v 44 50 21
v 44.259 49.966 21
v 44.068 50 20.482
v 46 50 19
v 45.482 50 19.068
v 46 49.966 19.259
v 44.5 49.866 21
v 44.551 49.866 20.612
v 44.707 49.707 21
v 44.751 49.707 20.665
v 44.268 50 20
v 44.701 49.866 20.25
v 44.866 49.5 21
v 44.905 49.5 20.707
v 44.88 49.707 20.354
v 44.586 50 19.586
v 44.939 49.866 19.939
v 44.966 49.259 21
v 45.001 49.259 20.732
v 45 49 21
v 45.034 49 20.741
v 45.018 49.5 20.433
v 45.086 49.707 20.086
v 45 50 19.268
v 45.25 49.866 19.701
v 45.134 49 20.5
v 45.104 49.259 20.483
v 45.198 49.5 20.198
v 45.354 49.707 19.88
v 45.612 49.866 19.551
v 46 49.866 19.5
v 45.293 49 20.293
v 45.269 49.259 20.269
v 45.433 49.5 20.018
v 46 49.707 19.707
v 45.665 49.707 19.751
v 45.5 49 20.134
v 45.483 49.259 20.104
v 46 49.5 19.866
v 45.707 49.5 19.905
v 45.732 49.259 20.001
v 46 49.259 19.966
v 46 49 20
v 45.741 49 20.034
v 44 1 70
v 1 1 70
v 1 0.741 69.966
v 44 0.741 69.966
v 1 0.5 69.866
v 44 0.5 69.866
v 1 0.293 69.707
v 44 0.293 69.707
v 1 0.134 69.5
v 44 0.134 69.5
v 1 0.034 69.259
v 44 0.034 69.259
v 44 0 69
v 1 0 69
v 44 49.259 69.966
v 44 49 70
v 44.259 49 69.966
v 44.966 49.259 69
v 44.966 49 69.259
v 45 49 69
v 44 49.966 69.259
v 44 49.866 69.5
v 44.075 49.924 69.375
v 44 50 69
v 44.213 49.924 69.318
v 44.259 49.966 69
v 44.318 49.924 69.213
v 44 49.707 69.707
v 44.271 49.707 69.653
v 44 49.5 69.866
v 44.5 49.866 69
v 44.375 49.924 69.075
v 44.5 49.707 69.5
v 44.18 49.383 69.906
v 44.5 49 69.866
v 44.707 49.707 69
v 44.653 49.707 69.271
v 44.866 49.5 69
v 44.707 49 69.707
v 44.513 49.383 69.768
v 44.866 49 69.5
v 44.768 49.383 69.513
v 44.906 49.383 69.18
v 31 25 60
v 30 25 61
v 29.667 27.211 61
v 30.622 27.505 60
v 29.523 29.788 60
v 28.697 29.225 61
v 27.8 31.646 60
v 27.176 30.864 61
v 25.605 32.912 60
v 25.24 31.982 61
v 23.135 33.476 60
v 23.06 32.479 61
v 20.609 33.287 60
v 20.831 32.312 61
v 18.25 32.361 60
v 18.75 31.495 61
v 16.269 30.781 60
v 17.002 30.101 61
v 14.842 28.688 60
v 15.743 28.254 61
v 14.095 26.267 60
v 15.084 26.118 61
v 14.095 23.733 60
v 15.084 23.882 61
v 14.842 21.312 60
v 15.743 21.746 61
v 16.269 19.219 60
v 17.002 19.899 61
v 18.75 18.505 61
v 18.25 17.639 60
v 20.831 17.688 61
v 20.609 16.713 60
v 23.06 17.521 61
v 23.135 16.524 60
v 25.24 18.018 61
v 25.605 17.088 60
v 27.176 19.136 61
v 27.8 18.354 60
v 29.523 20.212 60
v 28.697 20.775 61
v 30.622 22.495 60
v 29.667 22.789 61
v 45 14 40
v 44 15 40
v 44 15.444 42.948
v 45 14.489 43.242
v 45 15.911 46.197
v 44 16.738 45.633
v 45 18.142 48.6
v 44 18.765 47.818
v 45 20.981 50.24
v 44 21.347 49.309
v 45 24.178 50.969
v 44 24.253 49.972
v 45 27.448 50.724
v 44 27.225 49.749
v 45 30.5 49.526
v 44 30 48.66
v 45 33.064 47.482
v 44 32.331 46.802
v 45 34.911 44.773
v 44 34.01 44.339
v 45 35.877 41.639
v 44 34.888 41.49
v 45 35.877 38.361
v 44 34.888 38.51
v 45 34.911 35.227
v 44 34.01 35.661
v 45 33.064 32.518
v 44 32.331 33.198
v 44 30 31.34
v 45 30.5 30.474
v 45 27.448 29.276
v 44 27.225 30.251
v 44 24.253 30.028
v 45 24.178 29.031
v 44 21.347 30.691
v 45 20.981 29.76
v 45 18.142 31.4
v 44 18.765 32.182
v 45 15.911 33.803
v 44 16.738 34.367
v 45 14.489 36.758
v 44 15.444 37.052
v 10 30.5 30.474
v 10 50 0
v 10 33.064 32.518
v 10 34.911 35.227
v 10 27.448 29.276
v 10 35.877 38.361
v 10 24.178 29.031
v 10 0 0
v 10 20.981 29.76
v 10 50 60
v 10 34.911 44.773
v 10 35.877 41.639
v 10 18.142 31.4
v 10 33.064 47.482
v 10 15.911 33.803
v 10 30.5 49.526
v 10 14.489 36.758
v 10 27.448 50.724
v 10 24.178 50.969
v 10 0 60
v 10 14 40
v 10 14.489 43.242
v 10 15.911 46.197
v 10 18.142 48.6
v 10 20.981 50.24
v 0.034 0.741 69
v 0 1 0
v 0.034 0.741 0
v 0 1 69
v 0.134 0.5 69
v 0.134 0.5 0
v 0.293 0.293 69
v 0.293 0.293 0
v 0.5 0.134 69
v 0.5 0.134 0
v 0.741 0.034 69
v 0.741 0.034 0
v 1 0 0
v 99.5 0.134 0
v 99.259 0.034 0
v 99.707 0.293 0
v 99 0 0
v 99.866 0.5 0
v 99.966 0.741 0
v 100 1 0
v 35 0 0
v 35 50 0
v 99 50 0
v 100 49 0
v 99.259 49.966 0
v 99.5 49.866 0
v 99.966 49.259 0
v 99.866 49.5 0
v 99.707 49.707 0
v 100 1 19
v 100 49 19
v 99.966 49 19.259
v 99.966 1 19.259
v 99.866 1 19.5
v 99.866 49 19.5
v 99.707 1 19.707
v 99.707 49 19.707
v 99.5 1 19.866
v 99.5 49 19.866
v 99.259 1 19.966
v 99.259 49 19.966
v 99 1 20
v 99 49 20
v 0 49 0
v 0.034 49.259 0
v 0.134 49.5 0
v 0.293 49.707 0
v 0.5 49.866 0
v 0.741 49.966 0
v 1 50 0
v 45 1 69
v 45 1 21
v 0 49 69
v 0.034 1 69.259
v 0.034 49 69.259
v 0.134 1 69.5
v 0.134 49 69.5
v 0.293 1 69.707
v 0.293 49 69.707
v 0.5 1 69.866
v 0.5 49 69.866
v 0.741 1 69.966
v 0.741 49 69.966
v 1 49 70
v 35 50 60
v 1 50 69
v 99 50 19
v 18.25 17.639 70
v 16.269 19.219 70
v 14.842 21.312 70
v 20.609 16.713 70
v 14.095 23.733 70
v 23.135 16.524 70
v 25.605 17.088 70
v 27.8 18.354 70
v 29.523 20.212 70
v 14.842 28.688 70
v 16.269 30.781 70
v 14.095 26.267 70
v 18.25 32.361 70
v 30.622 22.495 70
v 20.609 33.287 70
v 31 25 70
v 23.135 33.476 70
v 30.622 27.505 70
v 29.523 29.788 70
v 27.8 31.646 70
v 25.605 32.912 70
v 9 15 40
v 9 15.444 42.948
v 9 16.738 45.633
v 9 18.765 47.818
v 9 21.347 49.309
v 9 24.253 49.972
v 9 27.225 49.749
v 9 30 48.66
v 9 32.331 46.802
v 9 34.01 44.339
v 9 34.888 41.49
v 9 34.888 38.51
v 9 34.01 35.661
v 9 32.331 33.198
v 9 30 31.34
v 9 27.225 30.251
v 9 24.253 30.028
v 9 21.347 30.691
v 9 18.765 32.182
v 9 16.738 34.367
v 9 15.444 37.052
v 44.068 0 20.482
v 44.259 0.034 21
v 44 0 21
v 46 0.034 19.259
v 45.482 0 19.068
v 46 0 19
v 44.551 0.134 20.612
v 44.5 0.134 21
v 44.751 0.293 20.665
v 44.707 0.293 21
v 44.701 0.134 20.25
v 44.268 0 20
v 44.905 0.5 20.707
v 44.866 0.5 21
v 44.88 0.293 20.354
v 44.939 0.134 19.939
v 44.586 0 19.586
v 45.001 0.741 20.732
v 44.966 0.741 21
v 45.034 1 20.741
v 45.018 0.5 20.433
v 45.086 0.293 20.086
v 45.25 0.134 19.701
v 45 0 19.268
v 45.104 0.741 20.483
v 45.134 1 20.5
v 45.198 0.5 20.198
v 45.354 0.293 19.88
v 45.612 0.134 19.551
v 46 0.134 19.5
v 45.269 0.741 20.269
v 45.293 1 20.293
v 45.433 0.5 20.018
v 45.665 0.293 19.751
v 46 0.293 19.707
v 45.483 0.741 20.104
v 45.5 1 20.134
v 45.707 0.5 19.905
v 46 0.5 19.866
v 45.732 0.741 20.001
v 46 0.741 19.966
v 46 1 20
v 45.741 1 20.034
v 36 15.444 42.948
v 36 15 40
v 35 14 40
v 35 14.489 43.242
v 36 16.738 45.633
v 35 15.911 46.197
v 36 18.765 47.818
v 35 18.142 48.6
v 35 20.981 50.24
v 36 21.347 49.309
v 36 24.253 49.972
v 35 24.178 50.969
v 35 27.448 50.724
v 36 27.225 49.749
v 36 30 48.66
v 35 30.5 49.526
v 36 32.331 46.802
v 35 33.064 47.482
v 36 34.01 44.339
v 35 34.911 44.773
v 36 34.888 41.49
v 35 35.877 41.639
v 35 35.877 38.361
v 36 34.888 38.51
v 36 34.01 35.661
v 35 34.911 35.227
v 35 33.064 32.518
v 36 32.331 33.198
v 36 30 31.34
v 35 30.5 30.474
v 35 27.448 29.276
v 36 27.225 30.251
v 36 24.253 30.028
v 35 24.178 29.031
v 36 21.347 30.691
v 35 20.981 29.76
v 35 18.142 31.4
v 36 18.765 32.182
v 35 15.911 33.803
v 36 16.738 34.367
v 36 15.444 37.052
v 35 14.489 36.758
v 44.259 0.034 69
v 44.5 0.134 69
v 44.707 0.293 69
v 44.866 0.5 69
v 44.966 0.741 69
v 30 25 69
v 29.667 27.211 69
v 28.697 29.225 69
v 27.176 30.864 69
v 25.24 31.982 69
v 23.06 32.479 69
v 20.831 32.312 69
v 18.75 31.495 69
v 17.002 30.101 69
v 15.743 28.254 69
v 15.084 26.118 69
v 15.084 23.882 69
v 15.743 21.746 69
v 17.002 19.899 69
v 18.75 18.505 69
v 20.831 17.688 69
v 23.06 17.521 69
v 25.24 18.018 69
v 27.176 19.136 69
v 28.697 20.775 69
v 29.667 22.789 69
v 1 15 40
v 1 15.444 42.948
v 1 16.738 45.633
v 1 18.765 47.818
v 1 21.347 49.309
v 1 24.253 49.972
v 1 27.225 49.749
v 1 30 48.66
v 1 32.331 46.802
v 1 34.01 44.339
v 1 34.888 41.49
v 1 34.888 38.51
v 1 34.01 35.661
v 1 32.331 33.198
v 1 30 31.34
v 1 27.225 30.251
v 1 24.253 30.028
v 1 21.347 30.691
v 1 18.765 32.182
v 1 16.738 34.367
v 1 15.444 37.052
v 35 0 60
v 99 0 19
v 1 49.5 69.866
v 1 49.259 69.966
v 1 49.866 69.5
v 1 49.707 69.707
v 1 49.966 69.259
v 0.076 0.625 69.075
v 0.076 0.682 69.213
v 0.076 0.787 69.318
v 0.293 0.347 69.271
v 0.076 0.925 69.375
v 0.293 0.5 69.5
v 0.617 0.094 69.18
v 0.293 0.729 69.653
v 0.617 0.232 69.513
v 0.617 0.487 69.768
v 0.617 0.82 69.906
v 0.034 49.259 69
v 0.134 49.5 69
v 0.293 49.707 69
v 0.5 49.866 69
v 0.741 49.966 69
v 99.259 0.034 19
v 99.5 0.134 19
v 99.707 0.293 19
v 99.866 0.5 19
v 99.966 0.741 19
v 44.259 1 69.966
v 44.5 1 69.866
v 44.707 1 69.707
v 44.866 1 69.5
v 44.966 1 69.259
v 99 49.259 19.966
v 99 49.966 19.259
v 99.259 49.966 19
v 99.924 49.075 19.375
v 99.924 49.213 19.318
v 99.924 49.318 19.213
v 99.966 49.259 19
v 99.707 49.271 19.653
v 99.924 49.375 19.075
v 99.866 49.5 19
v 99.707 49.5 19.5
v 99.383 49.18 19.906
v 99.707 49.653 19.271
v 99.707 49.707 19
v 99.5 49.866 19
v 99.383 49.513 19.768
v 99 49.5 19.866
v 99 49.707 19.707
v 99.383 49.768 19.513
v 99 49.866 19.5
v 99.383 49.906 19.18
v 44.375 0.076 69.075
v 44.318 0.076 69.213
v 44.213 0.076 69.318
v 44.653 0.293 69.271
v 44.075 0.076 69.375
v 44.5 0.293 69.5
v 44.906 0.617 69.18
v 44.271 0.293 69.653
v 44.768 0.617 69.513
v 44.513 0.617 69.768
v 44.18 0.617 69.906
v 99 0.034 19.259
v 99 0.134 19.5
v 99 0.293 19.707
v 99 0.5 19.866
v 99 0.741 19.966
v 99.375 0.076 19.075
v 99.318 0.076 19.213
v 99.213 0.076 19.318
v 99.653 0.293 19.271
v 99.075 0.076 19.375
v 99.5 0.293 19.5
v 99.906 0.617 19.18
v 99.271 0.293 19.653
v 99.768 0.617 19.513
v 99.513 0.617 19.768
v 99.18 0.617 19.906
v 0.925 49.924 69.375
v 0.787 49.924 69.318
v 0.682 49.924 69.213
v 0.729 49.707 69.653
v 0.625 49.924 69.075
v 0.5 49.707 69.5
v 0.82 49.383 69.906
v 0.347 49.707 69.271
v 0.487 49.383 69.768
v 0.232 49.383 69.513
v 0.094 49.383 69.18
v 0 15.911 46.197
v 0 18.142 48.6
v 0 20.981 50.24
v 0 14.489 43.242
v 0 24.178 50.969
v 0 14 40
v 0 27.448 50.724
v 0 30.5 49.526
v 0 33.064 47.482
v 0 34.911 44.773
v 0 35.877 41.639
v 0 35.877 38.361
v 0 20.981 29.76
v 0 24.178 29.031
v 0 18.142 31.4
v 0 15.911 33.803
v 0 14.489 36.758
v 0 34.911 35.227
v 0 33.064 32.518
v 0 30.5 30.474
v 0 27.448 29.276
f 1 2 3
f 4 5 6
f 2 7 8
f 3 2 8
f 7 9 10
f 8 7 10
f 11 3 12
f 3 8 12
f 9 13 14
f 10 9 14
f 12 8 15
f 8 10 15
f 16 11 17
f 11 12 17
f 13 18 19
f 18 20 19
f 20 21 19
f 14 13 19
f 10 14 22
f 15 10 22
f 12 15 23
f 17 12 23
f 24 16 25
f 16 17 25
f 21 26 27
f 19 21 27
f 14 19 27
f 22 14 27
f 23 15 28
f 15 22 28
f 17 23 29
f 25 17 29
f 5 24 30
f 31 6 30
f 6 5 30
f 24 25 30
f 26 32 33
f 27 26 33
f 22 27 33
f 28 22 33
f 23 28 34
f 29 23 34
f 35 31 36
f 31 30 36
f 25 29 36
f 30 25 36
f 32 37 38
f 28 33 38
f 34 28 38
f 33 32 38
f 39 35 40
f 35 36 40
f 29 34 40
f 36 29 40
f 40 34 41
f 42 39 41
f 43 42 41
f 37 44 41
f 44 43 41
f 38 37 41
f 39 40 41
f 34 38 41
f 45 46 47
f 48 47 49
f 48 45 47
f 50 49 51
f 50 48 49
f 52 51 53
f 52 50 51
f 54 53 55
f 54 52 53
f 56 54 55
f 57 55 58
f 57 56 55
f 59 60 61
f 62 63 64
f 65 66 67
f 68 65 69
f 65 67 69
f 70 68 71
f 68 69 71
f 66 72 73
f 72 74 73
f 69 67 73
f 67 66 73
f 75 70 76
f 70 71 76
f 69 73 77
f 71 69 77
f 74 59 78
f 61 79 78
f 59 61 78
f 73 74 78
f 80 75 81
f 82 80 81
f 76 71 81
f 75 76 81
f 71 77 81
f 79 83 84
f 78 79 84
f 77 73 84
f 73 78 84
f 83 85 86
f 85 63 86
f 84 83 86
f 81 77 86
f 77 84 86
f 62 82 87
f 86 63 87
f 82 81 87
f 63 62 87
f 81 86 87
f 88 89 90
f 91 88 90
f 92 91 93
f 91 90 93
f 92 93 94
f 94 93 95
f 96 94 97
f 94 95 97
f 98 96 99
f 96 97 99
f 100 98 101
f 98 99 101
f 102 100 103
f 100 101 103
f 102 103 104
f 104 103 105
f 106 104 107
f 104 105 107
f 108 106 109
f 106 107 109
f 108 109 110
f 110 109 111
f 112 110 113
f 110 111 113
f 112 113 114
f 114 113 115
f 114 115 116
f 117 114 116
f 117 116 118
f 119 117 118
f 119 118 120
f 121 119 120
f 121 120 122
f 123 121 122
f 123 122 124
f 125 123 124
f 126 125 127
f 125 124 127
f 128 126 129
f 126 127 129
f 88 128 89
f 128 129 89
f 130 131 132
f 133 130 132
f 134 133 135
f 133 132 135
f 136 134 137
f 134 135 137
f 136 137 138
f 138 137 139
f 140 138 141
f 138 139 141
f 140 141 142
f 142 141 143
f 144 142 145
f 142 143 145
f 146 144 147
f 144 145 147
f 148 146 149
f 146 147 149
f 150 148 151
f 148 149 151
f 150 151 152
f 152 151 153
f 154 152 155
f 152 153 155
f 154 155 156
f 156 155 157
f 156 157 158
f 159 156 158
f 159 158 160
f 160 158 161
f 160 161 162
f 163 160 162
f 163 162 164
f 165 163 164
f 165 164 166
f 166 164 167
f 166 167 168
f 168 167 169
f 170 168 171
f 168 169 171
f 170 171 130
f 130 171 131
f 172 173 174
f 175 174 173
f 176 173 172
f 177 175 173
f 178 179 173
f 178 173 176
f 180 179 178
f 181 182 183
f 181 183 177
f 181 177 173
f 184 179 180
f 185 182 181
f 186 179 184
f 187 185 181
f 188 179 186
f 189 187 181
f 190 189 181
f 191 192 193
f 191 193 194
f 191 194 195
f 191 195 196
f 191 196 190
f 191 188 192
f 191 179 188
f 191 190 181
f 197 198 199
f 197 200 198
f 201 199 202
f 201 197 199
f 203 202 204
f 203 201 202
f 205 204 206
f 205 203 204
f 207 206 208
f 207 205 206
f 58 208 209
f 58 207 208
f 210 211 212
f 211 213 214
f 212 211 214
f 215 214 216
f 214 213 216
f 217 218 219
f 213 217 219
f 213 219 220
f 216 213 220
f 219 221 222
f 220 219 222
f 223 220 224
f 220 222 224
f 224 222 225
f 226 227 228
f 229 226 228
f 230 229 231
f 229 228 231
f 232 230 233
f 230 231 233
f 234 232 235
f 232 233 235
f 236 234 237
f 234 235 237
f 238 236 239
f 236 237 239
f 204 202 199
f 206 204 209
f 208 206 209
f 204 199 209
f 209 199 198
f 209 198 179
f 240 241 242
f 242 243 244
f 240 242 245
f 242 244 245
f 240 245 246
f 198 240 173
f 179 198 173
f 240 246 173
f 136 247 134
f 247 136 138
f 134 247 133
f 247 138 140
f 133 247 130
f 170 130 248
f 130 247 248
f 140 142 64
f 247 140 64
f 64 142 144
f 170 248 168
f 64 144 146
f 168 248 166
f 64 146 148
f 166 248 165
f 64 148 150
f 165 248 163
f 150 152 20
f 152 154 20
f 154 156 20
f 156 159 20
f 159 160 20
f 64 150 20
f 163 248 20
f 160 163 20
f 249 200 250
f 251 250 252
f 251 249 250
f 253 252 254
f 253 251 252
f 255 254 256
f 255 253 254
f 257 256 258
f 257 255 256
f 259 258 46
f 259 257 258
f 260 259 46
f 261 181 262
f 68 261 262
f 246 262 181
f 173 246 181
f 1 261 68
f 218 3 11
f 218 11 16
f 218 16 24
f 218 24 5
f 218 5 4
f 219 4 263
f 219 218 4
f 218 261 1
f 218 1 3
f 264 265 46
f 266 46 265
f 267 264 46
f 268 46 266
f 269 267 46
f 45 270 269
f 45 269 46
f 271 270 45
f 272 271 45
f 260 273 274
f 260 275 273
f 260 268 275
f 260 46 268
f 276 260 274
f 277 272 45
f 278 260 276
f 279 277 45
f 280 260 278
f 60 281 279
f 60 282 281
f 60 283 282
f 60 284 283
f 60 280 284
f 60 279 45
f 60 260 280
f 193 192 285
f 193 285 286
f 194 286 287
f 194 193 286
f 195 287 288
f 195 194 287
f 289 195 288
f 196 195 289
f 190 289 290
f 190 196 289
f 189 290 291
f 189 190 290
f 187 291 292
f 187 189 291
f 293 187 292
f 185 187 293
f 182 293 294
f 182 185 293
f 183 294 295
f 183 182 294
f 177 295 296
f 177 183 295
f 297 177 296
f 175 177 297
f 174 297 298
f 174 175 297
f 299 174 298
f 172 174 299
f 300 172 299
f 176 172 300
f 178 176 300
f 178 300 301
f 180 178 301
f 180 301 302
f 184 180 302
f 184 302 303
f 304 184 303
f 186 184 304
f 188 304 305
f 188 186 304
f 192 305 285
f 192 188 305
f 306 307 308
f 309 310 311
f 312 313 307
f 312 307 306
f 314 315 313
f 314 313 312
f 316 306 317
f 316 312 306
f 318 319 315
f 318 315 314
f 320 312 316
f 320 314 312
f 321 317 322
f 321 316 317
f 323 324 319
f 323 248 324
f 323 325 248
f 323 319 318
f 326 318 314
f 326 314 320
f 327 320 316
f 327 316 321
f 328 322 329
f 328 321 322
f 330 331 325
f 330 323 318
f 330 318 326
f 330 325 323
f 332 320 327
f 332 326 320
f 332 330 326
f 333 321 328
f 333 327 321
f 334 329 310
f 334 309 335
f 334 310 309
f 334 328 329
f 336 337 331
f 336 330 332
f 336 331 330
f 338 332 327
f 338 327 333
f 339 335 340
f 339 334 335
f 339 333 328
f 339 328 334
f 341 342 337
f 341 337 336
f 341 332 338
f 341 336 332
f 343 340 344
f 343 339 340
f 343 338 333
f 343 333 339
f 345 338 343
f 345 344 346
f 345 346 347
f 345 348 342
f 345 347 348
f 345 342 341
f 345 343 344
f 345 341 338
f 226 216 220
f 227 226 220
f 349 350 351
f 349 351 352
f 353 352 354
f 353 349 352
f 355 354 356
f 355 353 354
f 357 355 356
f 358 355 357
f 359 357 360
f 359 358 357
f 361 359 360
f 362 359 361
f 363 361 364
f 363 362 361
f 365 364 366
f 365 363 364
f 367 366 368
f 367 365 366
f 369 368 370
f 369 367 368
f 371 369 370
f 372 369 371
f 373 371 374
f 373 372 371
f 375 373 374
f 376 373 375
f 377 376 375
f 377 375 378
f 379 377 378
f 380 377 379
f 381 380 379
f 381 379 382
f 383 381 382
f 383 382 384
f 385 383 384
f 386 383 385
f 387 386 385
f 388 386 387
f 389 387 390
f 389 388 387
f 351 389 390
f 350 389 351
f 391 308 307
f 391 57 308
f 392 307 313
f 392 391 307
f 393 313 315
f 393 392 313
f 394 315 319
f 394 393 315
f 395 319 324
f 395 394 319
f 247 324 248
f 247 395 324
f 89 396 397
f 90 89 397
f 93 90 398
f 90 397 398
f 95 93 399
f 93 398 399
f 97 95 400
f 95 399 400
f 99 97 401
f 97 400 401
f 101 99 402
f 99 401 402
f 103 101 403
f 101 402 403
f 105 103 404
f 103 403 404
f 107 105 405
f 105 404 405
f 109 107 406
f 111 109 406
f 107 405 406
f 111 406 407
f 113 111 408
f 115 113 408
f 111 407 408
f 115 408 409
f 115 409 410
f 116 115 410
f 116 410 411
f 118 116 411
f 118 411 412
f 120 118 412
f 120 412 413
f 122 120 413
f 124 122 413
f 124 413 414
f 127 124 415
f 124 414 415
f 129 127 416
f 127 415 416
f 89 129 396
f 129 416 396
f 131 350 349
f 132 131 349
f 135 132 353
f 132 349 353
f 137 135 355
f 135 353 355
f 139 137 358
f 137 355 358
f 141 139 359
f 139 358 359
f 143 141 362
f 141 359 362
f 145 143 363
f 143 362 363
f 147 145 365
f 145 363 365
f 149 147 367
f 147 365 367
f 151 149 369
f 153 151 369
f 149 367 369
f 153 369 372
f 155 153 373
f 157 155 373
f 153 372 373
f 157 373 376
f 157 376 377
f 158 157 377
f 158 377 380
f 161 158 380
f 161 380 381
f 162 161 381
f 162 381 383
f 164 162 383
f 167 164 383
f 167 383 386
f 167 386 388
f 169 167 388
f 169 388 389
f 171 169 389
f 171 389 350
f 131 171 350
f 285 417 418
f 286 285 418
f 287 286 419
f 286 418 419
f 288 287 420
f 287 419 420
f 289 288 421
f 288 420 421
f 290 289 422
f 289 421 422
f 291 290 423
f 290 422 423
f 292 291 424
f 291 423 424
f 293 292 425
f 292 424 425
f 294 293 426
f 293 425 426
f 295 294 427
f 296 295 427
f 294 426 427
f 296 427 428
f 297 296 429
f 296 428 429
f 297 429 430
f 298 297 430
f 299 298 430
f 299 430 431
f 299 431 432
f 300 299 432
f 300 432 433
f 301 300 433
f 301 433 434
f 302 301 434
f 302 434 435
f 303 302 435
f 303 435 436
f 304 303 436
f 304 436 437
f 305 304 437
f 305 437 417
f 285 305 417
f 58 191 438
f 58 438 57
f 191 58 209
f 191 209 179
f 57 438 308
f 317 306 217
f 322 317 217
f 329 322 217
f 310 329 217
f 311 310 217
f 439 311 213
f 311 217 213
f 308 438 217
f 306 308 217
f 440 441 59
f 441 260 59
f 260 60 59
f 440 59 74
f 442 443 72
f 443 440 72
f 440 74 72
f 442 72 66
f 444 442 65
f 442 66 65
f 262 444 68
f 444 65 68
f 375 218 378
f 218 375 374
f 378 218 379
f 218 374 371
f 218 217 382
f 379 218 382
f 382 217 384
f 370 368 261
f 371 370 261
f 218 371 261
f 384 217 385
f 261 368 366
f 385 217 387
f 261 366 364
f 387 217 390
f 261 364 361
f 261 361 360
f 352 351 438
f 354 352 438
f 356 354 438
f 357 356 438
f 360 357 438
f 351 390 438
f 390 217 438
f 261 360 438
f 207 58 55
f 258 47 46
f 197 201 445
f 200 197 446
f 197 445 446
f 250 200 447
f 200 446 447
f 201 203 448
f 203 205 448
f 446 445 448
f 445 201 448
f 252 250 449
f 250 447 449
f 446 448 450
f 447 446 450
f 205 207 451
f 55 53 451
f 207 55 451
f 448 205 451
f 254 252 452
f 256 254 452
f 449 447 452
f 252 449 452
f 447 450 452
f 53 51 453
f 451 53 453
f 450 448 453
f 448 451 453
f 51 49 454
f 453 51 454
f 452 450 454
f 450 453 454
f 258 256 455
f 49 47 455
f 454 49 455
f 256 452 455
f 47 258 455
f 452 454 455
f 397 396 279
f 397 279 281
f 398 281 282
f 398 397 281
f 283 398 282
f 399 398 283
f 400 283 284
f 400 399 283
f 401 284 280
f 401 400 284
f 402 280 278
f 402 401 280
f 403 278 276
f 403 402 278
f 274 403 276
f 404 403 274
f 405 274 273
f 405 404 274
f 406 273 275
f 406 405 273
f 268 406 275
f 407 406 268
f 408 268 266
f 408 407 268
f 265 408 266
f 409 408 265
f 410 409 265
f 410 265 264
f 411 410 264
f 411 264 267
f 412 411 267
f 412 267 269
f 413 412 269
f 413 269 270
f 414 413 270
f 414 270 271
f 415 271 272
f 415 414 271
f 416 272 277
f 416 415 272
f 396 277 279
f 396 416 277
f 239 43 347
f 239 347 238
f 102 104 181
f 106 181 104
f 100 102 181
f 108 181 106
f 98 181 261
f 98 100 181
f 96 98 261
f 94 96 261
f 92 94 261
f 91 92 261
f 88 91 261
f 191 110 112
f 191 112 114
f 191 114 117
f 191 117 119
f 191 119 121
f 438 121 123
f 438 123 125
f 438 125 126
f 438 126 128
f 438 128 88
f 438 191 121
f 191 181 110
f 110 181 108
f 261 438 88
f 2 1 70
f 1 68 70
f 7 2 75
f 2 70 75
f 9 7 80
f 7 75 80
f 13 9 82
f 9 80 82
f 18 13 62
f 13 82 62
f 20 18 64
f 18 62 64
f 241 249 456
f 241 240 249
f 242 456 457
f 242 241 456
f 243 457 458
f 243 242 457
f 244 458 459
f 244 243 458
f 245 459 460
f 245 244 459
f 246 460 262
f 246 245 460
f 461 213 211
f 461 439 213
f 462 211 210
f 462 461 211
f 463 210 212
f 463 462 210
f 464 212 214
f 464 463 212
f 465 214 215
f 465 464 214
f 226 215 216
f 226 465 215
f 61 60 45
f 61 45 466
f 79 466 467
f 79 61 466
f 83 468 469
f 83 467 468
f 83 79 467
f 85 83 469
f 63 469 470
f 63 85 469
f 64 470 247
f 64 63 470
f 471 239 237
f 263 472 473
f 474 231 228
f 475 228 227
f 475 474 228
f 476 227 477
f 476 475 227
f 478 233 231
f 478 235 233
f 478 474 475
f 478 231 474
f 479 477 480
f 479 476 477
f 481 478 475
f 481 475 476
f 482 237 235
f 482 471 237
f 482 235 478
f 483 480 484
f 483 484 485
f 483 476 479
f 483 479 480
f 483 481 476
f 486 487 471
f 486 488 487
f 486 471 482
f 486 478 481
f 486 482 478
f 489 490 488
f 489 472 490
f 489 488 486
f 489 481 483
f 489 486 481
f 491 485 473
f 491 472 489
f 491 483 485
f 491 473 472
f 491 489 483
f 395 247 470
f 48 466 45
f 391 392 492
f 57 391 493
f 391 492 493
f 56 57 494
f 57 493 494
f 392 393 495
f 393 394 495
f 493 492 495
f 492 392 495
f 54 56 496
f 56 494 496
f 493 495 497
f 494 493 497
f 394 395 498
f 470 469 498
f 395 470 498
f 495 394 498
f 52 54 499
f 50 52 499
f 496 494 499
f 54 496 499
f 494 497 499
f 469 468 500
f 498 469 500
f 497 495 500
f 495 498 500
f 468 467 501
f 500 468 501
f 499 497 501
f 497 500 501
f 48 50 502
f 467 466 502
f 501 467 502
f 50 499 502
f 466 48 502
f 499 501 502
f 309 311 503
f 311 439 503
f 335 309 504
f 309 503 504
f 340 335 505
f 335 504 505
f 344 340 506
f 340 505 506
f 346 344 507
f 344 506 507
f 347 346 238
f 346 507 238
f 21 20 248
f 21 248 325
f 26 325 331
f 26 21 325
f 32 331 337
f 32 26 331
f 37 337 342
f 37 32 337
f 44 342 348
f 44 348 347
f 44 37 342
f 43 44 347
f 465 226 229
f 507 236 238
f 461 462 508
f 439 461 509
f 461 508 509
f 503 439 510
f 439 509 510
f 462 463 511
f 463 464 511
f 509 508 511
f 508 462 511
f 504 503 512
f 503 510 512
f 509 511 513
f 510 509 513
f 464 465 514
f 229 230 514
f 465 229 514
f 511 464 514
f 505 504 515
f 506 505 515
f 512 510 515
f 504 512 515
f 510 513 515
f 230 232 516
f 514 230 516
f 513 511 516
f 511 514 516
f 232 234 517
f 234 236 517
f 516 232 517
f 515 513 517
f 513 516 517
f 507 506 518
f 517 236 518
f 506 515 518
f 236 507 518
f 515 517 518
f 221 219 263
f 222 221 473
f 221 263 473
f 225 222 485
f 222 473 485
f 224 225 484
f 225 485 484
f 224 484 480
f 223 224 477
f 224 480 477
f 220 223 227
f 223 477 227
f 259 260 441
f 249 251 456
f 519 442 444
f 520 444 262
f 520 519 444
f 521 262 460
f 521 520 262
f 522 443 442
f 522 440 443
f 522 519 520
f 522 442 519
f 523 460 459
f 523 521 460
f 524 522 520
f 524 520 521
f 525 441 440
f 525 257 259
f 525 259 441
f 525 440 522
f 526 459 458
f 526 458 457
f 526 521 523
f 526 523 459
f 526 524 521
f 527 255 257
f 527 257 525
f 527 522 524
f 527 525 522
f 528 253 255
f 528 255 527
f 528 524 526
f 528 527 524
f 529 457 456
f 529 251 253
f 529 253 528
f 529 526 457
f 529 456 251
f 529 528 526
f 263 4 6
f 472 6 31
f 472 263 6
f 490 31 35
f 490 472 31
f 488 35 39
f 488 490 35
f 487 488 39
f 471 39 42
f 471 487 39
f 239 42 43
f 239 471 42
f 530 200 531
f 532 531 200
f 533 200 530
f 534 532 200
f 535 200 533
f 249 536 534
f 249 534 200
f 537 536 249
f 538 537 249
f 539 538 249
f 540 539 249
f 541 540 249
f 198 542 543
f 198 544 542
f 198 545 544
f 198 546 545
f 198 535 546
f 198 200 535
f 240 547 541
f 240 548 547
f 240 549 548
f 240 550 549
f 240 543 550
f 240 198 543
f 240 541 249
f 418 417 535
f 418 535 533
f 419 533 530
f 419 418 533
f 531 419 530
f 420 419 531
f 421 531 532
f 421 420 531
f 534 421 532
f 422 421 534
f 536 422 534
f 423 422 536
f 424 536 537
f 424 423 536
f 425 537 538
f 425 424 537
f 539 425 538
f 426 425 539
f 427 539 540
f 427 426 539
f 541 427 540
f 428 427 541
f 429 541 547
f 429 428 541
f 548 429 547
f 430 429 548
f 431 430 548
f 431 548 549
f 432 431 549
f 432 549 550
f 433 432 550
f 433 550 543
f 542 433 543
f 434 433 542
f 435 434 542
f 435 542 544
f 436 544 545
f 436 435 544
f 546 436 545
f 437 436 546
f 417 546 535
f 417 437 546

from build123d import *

# Parameters (mm, degrees)
F0_W     = 100
F0_H     = 50
F1_DEPTH = 20
F2_W     = 45
F2_H     = 50
F3_DEPTH = 50
F4_W     = 25
F4_H     = 60
F5_DEPTH = 50.001
F6_R     = 10
F7_DEPTH = 45
F8_R     = 7.5
F9_DEPTH = 10
F10_R    = 1
F11_SIZE = 1


with BuildPart() as f1:
    # F0 (on Top) → F1 (new body)
    with BuildSketch(Plane.XY):
        with Locations((50, 25)):
            Rectangle(F0_W, F0_H)
    extrude(amount=F1_DEPTH)

    # F2 (on face) → F3 (join)
    with BuildSketch(Plane.XY.offset(20)):
        with Locations((22.5, 25)):
            Rectangle(F2_W, F2_H)
    extrude(amount=F3_DEPTH)

    # F4 (on face) → F5 (cut, through all)
    with BuildSketch(Plane.XZ):
        with Locations((22.5, 30)):
            Rectangle(F4_W, F4_H)
    extrude(amount=-F5_DEPTH, mode=Mode.SUBTRACT)

    # F6 (on face) → F7 (cut, through all)
    with BuildSketch(Plane(origin=(0, 0, 0), x_dir=(0, -1, 0), z_dir=(-1, 0, 0))):
        with Locations((-25, 40)):
            Circle(F6_R)
    extrude(amount=-F7_DEPTH, mode=Mode.SUBTRACT)

    # F8 (on face) → F9 (cut, through all)
    with BuildSketch(Plane.XY.offset(70)):
        with Locations((22.5, 25)):
            Circle(F8_R)
    extrude(amount=-F9_DEPTH, mode=Mode.SUBTRACT)

    # F10
    f10_edges = [f1.edges().sort_by_distance(p)[0] for p in [
        (45, 25, 70),
        (45, 25, 20),
        (45, 0, 45),
        (22.5, 0, 70),
        (0, 0, 35),
        (0, 25, 70),
        (22.5, 50, 70),
        (45, 50, 45),
        (72.5, 50, 20),
        (100, 25, 20),
        (0, 50, 35),
        (100, 0, 10),
        (100, 50, 10),
        (72.5, 0, 20),
    ]]
    fillet(f10_edges, radius=F10_R)

    # F11
    f11_edges = [f1.edges().sort_by_distance(p)[0] for p in [
        (45, 35, 40),
        (10, 35, 40),
        (35, 35, 40),
        (0, 35, 40),
        (15, 25, 70),
        (15, 25, 60),
    ]]
    chamfer(f11_edges, length=F11_SIZE)


solid = f1.part
